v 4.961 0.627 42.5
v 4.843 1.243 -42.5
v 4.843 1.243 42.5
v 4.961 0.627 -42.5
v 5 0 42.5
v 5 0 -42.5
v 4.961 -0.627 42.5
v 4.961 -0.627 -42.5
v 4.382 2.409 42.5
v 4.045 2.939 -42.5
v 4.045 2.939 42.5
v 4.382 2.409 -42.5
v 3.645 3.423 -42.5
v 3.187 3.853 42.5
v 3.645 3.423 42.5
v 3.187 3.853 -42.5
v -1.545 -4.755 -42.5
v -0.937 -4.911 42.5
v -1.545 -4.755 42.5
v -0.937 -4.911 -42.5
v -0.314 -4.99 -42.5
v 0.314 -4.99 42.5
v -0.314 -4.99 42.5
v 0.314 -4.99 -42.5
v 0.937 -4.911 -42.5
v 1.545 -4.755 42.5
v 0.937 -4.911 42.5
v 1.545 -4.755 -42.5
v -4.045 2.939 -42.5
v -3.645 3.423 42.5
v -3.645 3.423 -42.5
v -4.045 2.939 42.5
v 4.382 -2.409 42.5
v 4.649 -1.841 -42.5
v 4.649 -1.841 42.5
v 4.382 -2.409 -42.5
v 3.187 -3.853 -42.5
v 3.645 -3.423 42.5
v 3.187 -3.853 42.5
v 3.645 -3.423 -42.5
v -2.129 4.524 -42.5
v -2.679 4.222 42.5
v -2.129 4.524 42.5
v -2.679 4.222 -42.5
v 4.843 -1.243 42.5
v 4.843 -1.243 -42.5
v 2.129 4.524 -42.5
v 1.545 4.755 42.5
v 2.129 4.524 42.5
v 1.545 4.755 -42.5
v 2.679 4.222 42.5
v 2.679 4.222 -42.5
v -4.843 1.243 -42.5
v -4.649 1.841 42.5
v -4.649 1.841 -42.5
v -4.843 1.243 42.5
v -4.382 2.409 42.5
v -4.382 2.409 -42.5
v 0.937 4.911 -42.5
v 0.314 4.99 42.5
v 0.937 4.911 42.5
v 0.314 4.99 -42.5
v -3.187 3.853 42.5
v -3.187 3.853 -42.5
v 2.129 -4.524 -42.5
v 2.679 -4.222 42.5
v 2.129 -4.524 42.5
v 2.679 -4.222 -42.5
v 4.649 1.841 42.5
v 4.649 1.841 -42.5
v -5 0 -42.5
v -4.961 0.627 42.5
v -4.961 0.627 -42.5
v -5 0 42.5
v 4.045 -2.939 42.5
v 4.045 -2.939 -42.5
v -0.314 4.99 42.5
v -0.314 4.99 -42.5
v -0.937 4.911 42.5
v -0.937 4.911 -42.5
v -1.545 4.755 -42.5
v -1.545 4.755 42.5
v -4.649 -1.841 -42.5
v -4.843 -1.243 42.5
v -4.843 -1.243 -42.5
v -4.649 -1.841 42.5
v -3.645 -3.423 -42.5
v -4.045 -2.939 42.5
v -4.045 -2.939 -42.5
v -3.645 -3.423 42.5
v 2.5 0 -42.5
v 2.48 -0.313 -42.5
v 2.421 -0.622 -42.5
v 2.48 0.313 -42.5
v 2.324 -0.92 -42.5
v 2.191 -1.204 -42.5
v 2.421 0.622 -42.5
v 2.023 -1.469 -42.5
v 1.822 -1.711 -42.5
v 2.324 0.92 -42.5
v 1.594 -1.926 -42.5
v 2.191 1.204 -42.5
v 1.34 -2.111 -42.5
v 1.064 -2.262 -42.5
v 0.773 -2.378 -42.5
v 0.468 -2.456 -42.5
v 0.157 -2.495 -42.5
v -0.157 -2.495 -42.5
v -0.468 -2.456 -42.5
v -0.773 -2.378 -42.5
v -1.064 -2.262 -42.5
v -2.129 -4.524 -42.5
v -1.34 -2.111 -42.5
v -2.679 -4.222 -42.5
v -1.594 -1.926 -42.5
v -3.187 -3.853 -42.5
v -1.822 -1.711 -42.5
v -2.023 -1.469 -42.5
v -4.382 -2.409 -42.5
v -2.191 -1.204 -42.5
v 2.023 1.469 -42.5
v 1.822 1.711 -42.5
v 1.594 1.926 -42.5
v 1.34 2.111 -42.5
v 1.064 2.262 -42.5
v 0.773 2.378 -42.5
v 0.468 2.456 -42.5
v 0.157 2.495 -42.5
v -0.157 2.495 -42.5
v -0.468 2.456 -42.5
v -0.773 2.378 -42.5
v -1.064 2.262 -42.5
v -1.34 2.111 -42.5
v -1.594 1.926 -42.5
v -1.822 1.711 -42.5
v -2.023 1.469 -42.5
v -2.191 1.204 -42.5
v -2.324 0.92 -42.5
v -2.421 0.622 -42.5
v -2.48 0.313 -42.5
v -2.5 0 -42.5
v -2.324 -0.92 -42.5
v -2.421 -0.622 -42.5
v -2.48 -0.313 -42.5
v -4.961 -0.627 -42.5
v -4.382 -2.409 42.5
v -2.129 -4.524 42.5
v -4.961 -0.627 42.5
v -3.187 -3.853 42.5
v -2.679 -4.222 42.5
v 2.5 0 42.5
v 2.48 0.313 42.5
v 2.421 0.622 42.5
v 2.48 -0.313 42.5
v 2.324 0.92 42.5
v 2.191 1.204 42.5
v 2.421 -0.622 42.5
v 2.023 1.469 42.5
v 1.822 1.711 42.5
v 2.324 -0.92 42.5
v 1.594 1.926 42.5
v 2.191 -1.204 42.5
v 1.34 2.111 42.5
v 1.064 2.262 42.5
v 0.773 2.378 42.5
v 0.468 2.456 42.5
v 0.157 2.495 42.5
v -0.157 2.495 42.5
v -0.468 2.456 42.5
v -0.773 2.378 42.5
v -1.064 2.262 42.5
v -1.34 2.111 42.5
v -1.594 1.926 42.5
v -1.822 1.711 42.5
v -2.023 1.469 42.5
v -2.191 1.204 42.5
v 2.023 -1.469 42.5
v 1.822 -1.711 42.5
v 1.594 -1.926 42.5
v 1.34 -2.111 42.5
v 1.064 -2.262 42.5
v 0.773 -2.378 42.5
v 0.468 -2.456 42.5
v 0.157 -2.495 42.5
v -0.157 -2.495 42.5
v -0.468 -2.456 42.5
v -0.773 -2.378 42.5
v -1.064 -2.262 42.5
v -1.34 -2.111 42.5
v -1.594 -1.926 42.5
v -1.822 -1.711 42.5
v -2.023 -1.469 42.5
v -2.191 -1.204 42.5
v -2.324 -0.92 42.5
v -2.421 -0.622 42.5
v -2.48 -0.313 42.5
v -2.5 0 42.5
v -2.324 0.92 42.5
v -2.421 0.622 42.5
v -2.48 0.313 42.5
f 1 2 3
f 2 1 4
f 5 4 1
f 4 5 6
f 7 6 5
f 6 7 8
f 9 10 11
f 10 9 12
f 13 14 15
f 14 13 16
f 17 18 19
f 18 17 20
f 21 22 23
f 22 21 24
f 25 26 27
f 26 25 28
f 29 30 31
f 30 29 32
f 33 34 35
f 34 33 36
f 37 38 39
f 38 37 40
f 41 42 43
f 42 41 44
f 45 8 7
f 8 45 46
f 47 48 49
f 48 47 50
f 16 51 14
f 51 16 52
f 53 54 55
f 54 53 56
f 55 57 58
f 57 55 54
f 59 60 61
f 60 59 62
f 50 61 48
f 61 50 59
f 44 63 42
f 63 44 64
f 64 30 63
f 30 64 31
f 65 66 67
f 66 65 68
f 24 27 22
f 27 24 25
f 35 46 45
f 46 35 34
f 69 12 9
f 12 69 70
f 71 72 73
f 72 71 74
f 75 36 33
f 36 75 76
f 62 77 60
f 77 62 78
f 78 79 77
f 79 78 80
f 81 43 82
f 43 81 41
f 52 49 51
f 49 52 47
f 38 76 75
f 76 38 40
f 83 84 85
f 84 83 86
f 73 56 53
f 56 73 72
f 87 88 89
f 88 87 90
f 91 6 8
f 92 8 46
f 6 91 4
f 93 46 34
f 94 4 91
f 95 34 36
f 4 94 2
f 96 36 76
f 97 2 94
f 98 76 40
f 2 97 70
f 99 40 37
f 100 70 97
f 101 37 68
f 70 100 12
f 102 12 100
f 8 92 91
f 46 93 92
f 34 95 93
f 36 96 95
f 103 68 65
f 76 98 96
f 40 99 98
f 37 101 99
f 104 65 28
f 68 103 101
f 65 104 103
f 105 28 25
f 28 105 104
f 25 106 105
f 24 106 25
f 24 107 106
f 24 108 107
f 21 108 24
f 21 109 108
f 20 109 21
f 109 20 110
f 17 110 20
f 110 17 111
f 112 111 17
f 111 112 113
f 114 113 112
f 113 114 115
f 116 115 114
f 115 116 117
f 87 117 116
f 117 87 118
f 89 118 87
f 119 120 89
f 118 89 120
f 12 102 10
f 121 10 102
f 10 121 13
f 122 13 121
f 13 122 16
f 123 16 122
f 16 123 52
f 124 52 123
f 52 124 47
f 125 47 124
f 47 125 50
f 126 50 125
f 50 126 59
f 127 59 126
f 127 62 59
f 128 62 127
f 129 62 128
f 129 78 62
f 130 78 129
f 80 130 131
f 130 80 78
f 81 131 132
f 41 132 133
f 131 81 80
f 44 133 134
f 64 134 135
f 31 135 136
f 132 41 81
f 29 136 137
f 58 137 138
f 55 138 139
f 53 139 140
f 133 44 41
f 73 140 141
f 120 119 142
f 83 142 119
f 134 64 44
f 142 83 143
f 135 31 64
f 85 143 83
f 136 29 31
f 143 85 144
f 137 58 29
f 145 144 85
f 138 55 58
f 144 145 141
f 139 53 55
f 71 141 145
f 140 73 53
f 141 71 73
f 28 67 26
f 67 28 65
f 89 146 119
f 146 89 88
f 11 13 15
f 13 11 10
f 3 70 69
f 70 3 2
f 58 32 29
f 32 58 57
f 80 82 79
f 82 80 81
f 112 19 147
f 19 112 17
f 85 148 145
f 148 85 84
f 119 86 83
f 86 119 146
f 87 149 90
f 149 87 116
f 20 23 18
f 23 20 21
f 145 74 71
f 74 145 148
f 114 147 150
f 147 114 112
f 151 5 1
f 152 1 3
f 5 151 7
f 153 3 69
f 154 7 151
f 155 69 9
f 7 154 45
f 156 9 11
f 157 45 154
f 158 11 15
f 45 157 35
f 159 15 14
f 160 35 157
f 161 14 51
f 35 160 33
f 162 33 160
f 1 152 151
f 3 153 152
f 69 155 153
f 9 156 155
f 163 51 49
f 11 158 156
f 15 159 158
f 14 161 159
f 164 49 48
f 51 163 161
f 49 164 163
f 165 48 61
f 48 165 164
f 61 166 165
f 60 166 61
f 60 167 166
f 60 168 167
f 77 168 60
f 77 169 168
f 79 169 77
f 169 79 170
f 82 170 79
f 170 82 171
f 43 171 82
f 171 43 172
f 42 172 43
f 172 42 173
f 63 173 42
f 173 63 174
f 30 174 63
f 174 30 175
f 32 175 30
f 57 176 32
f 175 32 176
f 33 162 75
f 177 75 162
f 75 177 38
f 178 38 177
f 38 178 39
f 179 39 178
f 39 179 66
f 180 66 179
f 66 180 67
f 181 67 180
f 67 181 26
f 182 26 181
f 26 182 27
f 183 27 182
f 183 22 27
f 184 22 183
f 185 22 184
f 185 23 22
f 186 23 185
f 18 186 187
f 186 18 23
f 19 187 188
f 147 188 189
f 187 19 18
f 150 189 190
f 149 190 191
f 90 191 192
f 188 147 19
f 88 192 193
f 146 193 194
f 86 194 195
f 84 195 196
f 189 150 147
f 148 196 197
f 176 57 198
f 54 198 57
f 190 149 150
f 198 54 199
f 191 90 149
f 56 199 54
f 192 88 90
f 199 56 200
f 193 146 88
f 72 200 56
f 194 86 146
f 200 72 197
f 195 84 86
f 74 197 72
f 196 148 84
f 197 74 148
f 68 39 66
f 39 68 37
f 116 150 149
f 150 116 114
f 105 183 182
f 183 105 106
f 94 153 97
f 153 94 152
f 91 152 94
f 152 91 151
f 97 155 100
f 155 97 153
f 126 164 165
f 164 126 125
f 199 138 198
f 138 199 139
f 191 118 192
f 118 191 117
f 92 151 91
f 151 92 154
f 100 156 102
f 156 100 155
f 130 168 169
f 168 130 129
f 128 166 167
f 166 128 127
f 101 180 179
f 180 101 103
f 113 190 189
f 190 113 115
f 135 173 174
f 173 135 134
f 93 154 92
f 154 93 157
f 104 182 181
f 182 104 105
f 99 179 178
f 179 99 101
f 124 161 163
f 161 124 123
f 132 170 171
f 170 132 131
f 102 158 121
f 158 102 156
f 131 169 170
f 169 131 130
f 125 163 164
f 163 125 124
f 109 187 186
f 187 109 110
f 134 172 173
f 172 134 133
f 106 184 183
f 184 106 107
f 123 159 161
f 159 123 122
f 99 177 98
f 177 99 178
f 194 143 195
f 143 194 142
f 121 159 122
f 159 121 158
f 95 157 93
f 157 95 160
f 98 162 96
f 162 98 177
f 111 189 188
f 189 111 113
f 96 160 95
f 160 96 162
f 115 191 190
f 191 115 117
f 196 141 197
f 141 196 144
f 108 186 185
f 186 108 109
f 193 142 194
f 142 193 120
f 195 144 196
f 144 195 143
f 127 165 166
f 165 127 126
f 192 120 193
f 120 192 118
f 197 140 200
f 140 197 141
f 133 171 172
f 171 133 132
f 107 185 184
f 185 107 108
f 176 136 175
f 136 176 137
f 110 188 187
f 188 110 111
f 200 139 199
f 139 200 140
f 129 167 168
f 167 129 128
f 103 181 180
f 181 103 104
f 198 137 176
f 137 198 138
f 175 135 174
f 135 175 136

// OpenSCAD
$fn = 50;


difference() {
	union() {
		translate(v = [0, 0, -42.5000000000]) {
			cylinder(h = 85, r = 5.0000000000);
		}
	}
	union() {
		translate(v = [0, 0, -100.0000000000]) {
			cylinder(h = 200, r = 2.5000000000);
		}
	}
}
